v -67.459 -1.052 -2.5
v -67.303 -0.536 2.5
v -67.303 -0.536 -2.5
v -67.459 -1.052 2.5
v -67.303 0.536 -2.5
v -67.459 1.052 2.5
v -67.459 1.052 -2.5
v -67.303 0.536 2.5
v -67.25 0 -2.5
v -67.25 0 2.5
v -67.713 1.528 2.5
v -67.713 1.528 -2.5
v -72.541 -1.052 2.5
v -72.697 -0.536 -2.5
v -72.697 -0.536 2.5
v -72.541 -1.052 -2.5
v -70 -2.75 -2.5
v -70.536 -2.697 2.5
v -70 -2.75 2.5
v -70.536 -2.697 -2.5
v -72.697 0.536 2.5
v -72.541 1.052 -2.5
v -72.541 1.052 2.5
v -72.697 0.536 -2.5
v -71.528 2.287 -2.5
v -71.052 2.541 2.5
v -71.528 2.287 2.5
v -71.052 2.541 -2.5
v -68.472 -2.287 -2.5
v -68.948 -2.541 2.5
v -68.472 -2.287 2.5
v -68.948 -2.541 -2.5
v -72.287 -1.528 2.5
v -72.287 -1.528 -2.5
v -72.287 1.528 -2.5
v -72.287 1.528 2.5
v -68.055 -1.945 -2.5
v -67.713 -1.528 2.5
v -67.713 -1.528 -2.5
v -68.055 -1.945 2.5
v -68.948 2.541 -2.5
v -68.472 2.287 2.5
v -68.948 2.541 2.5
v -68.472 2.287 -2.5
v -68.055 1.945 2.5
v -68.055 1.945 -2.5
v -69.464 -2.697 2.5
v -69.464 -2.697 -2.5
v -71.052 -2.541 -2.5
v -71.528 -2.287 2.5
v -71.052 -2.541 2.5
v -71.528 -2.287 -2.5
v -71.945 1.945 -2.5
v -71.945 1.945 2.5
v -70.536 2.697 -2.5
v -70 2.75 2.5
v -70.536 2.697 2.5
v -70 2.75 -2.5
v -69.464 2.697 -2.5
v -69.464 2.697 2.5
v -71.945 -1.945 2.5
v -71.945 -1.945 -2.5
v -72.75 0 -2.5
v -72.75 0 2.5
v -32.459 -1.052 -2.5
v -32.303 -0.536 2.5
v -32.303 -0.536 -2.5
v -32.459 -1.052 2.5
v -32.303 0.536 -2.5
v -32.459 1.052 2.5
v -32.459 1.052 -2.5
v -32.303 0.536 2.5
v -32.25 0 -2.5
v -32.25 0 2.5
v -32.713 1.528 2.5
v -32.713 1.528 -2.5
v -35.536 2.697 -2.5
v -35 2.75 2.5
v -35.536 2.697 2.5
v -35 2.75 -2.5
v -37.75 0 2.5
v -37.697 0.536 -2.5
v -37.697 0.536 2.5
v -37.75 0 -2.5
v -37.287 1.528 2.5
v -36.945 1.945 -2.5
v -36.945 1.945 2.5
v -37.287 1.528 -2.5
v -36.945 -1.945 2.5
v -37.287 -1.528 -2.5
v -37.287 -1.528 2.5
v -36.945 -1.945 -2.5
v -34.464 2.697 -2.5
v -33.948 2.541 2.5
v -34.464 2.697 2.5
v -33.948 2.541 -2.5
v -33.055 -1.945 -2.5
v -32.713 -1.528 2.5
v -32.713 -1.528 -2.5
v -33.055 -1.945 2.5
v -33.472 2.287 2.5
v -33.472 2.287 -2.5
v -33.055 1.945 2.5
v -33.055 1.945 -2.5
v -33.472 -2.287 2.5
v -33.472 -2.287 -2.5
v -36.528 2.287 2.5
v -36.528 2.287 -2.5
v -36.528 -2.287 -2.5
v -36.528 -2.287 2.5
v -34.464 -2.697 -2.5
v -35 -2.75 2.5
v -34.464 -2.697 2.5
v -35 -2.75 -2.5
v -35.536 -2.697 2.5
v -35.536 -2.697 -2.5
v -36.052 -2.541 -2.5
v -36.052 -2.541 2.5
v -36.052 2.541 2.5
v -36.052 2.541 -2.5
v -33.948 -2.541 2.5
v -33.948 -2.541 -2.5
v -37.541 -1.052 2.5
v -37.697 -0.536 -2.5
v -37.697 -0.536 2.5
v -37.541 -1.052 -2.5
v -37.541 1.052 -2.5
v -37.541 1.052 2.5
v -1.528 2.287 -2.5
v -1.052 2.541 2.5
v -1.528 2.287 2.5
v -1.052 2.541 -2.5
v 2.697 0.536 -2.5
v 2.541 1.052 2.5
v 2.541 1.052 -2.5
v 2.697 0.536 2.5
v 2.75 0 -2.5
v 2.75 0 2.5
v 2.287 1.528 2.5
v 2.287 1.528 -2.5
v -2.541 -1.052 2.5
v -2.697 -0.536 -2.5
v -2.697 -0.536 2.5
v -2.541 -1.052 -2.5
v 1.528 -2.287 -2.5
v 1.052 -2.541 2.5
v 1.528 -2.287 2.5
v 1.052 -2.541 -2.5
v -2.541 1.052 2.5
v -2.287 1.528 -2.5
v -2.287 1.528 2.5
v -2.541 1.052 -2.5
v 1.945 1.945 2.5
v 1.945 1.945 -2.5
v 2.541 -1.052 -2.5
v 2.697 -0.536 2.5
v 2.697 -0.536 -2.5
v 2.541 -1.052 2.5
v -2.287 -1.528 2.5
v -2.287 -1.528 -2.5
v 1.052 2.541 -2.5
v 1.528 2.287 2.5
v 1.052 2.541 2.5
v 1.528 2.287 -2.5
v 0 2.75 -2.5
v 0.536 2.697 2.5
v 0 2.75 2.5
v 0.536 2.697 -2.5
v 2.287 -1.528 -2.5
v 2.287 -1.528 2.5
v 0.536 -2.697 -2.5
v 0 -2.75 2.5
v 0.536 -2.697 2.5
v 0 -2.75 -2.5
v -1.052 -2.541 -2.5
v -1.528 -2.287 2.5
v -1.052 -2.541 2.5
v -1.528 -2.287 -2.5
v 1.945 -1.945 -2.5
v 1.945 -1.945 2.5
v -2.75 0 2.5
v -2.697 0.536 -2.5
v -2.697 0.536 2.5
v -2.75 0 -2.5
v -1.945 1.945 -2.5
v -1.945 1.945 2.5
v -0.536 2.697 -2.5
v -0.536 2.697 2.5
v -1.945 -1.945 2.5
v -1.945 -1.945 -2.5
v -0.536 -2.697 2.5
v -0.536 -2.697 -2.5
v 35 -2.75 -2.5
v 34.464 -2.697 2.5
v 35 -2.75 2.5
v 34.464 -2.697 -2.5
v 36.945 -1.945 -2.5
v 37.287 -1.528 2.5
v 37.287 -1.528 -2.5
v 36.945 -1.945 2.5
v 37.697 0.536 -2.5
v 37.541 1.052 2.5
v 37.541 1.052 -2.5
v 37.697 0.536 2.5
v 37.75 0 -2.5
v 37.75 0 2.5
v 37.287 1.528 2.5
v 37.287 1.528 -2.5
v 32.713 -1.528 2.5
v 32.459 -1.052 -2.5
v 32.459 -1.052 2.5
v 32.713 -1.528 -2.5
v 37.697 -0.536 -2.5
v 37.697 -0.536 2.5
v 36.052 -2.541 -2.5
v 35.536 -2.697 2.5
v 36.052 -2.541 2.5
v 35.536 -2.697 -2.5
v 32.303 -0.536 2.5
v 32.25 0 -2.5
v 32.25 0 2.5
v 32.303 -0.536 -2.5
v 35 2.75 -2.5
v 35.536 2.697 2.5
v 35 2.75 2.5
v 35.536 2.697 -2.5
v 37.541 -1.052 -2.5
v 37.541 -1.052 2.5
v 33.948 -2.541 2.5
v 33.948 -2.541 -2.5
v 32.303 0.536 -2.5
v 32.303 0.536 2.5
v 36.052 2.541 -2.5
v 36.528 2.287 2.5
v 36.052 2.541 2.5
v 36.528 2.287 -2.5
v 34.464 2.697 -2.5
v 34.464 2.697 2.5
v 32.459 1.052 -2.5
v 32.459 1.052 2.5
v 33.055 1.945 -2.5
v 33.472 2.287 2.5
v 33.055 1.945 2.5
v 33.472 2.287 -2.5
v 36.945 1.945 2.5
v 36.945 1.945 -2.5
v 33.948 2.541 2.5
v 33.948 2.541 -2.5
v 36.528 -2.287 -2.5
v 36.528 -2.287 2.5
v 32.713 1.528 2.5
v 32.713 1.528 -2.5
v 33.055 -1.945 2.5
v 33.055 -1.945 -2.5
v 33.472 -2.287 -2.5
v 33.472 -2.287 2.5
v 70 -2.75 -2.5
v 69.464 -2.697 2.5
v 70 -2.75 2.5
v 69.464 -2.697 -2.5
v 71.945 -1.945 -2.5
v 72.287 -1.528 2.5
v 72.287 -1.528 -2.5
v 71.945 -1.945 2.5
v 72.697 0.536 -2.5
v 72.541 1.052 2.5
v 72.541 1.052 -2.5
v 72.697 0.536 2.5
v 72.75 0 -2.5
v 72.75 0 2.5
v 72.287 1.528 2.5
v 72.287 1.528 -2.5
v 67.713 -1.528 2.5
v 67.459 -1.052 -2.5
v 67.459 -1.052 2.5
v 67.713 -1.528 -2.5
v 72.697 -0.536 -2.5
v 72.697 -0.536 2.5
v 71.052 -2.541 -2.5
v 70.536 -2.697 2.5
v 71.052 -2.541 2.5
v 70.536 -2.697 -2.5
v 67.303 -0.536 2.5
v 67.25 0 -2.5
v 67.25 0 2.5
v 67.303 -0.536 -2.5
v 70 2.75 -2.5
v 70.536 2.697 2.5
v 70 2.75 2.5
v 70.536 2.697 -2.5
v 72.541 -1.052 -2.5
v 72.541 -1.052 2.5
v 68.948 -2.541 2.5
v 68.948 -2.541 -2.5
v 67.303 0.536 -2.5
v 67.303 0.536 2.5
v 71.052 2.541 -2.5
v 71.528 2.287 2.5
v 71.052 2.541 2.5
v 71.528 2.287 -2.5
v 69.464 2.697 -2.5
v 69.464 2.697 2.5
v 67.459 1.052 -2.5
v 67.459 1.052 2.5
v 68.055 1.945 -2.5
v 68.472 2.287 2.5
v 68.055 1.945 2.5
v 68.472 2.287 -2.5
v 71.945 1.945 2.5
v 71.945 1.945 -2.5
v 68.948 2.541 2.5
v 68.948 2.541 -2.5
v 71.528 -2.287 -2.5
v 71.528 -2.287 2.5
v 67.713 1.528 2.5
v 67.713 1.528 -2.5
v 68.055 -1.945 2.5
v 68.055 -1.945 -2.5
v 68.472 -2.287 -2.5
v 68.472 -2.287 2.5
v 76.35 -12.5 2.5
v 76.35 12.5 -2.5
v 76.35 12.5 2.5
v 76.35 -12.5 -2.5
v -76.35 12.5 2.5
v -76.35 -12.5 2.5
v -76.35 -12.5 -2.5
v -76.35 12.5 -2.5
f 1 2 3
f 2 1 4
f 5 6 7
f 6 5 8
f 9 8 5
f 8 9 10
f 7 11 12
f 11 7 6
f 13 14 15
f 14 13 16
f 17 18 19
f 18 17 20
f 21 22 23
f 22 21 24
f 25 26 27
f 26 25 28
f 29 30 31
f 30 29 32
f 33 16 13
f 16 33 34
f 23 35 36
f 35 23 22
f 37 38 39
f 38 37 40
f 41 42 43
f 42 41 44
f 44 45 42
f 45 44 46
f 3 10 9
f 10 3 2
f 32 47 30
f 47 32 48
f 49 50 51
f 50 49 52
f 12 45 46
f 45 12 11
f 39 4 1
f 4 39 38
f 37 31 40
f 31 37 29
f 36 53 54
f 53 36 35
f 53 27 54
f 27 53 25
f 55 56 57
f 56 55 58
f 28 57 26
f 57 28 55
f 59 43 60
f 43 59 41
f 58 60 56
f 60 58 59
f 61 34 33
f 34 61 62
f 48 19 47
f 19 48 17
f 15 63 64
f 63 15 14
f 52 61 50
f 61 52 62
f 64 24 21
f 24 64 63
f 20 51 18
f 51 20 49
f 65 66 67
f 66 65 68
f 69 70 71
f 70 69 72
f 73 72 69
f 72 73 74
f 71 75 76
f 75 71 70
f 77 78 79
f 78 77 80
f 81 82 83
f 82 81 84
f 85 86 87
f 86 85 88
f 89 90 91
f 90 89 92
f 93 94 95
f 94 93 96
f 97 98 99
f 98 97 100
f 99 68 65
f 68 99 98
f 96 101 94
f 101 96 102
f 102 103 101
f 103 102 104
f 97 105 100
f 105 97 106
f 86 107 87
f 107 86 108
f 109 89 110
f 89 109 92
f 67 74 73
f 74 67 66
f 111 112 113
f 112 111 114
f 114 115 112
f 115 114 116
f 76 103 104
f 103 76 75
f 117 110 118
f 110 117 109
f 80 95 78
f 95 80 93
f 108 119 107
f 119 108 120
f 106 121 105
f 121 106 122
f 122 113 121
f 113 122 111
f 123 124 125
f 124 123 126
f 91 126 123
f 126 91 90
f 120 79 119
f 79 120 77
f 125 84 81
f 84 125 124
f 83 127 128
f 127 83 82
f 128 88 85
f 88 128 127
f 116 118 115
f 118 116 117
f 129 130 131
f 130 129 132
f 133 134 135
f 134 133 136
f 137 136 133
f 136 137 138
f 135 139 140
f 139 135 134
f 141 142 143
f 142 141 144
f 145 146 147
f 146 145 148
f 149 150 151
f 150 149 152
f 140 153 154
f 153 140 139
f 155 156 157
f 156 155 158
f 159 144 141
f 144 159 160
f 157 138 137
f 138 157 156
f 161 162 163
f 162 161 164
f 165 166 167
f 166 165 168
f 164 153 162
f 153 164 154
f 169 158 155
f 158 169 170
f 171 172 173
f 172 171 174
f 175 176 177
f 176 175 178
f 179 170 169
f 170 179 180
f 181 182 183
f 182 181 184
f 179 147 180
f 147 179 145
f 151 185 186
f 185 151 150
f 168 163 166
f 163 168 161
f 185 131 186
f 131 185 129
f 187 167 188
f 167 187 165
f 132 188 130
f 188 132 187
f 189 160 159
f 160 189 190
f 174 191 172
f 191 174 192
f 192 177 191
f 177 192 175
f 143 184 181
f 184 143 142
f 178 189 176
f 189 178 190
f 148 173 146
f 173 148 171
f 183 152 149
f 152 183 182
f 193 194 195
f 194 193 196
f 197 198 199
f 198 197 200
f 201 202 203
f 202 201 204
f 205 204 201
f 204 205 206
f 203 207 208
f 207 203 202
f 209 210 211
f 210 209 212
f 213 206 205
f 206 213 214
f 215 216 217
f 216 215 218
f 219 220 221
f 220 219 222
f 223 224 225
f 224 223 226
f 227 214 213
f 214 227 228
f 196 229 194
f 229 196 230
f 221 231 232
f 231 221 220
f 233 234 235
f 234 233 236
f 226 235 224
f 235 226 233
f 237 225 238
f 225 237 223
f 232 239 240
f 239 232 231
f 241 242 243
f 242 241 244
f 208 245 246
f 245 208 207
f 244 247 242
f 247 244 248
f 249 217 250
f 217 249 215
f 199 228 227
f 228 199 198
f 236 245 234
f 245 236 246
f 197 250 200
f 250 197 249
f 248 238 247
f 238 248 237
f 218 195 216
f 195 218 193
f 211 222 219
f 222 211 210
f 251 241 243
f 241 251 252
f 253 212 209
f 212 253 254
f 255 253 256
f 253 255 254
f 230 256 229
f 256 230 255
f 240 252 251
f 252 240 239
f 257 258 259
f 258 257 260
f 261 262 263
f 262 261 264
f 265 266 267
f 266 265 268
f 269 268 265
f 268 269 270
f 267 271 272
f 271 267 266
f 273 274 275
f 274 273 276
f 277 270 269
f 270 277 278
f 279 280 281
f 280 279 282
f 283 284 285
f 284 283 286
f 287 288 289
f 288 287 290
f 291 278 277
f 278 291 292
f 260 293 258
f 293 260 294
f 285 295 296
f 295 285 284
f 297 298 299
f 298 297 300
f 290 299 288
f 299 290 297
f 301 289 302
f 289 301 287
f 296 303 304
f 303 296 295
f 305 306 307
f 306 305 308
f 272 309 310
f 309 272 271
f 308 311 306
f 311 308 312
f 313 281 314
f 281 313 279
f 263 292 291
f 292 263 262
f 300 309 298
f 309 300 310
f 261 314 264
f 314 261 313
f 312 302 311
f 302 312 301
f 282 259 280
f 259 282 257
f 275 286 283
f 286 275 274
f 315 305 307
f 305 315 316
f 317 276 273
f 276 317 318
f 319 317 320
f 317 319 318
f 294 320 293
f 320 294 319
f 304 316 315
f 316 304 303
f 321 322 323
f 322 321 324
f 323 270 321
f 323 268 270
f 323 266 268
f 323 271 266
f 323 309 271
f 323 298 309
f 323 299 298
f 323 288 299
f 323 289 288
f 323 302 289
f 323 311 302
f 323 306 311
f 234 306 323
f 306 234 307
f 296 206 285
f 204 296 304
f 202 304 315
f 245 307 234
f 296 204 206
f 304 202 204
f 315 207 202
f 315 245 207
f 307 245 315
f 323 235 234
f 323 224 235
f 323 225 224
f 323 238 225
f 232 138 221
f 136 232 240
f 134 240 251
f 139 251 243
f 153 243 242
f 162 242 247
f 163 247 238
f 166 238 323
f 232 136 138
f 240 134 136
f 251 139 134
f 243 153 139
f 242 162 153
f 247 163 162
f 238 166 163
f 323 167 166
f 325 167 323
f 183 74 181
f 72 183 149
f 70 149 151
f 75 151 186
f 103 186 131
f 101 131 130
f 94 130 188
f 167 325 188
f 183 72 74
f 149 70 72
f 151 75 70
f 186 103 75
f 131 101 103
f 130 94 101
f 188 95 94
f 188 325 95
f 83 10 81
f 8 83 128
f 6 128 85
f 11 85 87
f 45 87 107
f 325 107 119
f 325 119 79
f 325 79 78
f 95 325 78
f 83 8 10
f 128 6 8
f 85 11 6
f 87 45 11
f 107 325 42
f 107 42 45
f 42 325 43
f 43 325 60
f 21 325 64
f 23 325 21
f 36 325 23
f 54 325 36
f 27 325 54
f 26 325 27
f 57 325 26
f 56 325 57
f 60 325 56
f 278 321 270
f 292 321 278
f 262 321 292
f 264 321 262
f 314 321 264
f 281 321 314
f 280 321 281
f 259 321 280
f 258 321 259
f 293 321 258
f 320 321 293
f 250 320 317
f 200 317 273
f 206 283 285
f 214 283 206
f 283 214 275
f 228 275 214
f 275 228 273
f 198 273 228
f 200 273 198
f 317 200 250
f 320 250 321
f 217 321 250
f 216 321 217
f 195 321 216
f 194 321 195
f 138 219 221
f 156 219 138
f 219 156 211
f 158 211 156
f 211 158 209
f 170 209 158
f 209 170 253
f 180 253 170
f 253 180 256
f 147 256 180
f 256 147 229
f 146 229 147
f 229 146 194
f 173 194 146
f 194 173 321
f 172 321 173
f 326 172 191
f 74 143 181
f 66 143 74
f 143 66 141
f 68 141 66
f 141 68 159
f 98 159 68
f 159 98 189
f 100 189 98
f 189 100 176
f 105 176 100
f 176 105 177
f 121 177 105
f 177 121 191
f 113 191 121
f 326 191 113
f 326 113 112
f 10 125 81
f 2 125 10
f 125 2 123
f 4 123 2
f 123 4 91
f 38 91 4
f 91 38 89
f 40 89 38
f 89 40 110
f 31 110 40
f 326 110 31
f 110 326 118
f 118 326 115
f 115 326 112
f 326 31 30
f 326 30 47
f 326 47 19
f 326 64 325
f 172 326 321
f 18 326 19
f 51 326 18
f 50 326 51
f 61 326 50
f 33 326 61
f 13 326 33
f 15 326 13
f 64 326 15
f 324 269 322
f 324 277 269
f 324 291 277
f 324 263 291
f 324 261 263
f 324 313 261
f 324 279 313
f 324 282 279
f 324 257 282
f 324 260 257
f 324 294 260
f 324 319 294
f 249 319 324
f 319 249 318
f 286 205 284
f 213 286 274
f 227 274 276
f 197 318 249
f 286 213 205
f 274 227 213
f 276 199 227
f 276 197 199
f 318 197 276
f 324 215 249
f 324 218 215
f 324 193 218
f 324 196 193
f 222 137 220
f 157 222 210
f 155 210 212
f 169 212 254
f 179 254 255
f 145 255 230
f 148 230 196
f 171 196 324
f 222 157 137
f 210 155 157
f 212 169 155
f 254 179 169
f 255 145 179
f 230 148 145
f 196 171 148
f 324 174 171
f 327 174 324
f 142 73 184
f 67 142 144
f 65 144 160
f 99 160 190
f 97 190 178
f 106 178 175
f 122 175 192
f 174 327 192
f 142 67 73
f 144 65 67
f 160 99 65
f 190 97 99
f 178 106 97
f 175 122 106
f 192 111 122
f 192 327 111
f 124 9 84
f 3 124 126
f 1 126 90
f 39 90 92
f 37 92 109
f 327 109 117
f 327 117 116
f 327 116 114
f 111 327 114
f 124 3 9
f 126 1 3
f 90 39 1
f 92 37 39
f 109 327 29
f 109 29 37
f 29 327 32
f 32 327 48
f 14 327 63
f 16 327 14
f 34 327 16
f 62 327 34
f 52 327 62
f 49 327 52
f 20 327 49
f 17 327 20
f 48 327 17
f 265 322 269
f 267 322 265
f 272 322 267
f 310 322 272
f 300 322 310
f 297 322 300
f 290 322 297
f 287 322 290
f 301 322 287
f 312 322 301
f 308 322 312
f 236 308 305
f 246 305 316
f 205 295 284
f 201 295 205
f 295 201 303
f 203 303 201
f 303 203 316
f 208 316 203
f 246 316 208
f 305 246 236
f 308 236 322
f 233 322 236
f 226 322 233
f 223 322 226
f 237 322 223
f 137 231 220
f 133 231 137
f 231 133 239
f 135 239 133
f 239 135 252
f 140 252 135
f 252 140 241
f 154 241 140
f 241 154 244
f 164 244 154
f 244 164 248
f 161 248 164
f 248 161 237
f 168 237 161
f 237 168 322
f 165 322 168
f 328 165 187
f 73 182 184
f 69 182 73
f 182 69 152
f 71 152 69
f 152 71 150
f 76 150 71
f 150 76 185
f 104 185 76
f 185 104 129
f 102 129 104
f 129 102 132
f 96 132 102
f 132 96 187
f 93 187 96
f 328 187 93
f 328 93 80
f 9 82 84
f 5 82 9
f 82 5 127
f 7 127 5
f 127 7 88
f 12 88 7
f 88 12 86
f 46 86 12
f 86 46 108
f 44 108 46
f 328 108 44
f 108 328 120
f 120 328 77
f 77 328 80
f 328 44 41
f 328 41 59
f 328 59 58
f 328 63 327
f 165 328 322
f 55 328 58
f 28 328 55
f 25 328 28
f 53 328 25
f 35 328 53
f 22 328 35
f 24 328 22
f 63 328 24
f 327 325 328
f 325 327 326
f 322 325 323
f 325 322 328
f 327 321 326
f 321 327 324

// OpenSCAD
$fn = 32;

// ----------------------------------------------------------------------
// Hole bar, 5 x Ø5.5
// skip layout, 6.35 mm edge offset
// ----------------------------------------------------------------------

// --- parameters (mm) ---
bar_w = 25;         // bar width (Y)
bar_t = 5;          // bar thickness (Z)
holes = 5;          // holes per row
hole_d = 5.5;       // hole diameter
edge = 6.35;        // offset from the bar end to the first hole
grid_pitch = 17.5;  // grid the bar was laid out on

// --- derived feature positions (mm) ---
pitch = grid_pitch * 2;       // = 35   holes sit every other grid slot
span = (holes - 1) * pitch;   // = 140   distance between the end holes
bar_l = span + 2 * edge;      // = 152.7   overall bar length
start_x = -bar_l / 2 + edge;  // = -70   X of the first hole
feature_centers = [
  [start_x + 0 * pitch, 0],
  [start_x + 1 * pitch, 0],
  [start_x + 2 * pitch, 0],
  [start_x + 3 * pitch, 0],
  [start_x + 4 * pitch, 0]
];   // hole centres of the first row

// bar with one row of holes, drilled from feature_centers
difference() {
  translate([-bar_l / 2, -bar_w / 2, -bar_t / 2]) cube([bar_l, bar_w, bar_t]);
  for (centre = feature_centers)
    translate([centre[0], centre[1], 0])
      cylinder(d = hole_d, h = bar_t + 2, center = true);
}
